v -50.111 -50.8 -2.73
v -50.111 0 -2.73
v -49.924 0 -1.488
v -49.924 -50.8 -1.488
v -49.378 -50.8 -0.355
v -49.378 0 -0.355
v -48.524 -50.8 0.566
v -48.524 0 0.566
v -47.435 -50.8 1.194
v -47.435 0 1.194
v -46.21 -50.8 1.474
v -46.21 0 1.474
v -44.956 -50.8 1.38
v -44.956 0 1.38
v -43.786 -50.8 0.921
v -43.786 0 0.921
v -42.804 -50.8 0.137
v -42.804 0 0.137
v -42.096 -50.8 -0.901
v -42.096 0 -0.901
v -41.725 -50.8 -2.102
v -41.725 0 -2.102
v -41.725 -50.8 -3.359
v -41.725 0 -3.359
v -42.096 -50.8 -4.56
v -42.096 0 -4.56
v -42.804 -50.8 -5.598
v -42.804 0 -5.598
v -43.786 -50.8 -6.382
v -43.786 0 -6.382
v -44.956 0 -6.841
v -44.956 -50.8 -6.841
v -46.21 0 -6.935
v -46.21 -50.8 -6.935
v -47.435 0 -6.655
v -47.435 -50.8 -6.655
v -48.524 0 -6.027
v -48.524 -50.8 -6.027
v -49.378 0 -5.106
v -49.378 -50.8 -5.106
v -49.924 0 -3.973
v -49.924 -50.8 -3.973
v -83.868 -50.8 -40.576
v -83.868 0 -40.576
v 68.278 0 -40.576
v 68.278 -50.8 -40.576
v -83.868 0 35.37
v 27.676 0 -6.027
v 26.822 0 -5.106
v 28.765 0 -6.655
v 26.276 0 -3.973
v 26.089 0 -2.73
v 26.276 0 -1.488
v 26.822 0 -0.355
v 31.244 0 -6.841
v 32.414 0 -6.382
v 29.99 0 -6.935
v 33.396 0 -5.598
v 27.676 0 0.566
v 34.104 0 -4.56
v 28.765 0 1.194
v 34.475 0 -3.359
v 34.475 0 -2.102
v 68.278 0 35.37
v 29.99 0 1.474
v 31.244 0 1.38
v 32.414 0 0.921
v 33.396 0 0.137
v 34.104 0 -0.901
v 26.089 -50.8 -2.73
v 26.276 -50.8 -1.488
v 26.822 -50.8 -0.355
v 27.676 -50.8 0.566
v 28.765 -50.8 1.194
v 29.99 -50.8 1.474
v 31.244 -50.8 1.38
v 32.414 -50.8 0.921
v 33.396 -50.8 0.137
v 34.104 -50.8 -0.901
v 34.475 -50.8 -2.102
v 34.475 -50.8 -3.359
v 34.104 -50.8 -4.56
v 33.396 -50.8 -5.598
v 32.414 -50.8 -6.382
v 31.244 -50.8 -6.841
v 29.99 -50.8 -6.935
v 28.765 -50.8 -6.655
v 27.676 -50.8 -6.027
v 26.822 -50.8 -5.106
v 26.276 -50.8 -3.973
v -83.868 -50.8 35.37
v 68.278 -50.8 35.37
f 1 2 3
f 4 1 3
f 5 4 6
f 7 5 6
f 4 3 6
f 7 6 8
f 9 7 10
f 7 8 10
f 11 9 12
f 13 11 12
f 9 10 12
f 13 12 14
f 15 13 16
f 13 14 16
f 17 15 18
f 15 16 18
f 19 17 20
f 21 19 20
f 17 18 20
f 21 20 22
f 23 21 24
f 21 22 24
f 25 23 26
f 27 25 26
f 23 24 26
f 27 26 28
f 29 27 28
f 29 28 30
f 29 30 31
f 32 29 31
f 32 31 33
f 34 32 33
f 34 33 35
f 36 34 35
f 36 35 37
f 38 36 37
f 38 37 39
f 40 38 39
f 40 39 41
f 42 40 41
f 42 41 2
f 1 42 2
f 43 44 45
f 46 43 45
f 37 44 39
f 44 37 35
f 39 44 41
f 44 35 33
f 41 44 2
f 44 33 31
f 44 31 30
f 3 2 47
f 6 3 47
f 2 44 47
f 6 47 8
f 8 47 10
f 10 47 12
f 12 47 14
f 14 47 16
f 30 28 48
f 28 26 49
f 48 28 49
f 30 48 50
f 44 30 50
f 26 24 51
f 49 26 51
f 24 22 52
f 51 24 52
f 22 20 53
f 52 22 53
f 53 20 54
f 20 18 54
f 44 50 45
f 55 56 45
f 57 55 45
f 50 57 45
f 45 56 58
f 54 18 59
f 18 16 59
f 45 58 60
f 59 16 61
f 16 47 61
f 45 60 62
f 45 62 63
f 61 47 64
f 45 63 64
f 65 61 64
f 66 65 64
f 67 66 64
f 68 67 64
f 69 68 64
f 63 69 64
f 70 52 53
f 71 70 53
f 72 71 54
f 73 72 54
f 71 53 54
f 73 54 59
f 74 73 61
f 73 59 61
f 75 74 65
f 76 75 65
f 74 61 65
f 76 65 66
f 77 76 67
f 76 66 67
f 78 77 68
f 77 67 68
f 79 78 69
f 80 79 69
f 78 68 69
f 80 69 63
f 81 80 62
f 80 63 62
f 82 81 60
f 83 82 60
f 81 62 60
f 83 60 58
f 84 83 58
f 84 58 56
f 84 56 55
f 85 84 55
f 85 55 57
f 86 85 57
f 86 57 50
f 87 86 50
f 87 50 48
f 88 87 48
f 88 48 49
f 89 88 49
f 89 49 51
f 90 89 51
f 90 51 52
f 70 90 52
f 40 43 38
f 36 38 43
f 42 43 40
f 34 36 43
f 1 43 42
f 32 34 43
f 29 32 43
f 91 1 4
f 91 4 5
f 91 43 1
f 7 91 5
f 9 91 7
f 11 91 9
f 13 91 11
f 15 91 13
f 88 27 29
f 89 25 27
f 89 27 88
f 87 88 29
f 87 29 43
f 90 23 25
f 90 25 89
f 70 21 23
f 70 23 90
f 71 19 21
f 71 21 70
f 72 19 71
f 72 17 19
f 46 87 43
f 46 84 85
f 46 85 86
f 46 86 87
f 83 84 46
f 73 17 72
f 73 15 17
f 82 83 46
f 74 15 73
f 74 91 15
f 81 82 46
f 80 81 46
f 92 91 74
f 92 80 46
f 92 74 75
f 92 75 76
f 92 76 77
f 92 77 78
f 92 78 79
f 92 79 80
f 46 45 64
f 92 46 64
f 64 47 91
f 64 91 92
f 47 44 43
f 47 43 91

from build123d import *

# Parameters (mm, degrees)
F0_W     = 152.146
F0_H     = 75.946
F1_DEPTH = 50.8
F3_D     = 8.4328


with BuildPart() as f1:
    # F0 (on Front) → F1 (new body)
    with BuildSketch(Plane.XZ):
        with Locations((-7.7946271856, -2.6034978698)):
            Rectangle(F0_W, F0_H)
    extrude(amount=F1_DEPTH)

    # F3 (through all)
    with Locations(Plane.XZ.offset(50.8)):
        with Locations((-45.8946271856, -2.7304978698), (30.3053728144, -2.7304978698)):
            Hole(F3_D / 2)


solid = f1.part
